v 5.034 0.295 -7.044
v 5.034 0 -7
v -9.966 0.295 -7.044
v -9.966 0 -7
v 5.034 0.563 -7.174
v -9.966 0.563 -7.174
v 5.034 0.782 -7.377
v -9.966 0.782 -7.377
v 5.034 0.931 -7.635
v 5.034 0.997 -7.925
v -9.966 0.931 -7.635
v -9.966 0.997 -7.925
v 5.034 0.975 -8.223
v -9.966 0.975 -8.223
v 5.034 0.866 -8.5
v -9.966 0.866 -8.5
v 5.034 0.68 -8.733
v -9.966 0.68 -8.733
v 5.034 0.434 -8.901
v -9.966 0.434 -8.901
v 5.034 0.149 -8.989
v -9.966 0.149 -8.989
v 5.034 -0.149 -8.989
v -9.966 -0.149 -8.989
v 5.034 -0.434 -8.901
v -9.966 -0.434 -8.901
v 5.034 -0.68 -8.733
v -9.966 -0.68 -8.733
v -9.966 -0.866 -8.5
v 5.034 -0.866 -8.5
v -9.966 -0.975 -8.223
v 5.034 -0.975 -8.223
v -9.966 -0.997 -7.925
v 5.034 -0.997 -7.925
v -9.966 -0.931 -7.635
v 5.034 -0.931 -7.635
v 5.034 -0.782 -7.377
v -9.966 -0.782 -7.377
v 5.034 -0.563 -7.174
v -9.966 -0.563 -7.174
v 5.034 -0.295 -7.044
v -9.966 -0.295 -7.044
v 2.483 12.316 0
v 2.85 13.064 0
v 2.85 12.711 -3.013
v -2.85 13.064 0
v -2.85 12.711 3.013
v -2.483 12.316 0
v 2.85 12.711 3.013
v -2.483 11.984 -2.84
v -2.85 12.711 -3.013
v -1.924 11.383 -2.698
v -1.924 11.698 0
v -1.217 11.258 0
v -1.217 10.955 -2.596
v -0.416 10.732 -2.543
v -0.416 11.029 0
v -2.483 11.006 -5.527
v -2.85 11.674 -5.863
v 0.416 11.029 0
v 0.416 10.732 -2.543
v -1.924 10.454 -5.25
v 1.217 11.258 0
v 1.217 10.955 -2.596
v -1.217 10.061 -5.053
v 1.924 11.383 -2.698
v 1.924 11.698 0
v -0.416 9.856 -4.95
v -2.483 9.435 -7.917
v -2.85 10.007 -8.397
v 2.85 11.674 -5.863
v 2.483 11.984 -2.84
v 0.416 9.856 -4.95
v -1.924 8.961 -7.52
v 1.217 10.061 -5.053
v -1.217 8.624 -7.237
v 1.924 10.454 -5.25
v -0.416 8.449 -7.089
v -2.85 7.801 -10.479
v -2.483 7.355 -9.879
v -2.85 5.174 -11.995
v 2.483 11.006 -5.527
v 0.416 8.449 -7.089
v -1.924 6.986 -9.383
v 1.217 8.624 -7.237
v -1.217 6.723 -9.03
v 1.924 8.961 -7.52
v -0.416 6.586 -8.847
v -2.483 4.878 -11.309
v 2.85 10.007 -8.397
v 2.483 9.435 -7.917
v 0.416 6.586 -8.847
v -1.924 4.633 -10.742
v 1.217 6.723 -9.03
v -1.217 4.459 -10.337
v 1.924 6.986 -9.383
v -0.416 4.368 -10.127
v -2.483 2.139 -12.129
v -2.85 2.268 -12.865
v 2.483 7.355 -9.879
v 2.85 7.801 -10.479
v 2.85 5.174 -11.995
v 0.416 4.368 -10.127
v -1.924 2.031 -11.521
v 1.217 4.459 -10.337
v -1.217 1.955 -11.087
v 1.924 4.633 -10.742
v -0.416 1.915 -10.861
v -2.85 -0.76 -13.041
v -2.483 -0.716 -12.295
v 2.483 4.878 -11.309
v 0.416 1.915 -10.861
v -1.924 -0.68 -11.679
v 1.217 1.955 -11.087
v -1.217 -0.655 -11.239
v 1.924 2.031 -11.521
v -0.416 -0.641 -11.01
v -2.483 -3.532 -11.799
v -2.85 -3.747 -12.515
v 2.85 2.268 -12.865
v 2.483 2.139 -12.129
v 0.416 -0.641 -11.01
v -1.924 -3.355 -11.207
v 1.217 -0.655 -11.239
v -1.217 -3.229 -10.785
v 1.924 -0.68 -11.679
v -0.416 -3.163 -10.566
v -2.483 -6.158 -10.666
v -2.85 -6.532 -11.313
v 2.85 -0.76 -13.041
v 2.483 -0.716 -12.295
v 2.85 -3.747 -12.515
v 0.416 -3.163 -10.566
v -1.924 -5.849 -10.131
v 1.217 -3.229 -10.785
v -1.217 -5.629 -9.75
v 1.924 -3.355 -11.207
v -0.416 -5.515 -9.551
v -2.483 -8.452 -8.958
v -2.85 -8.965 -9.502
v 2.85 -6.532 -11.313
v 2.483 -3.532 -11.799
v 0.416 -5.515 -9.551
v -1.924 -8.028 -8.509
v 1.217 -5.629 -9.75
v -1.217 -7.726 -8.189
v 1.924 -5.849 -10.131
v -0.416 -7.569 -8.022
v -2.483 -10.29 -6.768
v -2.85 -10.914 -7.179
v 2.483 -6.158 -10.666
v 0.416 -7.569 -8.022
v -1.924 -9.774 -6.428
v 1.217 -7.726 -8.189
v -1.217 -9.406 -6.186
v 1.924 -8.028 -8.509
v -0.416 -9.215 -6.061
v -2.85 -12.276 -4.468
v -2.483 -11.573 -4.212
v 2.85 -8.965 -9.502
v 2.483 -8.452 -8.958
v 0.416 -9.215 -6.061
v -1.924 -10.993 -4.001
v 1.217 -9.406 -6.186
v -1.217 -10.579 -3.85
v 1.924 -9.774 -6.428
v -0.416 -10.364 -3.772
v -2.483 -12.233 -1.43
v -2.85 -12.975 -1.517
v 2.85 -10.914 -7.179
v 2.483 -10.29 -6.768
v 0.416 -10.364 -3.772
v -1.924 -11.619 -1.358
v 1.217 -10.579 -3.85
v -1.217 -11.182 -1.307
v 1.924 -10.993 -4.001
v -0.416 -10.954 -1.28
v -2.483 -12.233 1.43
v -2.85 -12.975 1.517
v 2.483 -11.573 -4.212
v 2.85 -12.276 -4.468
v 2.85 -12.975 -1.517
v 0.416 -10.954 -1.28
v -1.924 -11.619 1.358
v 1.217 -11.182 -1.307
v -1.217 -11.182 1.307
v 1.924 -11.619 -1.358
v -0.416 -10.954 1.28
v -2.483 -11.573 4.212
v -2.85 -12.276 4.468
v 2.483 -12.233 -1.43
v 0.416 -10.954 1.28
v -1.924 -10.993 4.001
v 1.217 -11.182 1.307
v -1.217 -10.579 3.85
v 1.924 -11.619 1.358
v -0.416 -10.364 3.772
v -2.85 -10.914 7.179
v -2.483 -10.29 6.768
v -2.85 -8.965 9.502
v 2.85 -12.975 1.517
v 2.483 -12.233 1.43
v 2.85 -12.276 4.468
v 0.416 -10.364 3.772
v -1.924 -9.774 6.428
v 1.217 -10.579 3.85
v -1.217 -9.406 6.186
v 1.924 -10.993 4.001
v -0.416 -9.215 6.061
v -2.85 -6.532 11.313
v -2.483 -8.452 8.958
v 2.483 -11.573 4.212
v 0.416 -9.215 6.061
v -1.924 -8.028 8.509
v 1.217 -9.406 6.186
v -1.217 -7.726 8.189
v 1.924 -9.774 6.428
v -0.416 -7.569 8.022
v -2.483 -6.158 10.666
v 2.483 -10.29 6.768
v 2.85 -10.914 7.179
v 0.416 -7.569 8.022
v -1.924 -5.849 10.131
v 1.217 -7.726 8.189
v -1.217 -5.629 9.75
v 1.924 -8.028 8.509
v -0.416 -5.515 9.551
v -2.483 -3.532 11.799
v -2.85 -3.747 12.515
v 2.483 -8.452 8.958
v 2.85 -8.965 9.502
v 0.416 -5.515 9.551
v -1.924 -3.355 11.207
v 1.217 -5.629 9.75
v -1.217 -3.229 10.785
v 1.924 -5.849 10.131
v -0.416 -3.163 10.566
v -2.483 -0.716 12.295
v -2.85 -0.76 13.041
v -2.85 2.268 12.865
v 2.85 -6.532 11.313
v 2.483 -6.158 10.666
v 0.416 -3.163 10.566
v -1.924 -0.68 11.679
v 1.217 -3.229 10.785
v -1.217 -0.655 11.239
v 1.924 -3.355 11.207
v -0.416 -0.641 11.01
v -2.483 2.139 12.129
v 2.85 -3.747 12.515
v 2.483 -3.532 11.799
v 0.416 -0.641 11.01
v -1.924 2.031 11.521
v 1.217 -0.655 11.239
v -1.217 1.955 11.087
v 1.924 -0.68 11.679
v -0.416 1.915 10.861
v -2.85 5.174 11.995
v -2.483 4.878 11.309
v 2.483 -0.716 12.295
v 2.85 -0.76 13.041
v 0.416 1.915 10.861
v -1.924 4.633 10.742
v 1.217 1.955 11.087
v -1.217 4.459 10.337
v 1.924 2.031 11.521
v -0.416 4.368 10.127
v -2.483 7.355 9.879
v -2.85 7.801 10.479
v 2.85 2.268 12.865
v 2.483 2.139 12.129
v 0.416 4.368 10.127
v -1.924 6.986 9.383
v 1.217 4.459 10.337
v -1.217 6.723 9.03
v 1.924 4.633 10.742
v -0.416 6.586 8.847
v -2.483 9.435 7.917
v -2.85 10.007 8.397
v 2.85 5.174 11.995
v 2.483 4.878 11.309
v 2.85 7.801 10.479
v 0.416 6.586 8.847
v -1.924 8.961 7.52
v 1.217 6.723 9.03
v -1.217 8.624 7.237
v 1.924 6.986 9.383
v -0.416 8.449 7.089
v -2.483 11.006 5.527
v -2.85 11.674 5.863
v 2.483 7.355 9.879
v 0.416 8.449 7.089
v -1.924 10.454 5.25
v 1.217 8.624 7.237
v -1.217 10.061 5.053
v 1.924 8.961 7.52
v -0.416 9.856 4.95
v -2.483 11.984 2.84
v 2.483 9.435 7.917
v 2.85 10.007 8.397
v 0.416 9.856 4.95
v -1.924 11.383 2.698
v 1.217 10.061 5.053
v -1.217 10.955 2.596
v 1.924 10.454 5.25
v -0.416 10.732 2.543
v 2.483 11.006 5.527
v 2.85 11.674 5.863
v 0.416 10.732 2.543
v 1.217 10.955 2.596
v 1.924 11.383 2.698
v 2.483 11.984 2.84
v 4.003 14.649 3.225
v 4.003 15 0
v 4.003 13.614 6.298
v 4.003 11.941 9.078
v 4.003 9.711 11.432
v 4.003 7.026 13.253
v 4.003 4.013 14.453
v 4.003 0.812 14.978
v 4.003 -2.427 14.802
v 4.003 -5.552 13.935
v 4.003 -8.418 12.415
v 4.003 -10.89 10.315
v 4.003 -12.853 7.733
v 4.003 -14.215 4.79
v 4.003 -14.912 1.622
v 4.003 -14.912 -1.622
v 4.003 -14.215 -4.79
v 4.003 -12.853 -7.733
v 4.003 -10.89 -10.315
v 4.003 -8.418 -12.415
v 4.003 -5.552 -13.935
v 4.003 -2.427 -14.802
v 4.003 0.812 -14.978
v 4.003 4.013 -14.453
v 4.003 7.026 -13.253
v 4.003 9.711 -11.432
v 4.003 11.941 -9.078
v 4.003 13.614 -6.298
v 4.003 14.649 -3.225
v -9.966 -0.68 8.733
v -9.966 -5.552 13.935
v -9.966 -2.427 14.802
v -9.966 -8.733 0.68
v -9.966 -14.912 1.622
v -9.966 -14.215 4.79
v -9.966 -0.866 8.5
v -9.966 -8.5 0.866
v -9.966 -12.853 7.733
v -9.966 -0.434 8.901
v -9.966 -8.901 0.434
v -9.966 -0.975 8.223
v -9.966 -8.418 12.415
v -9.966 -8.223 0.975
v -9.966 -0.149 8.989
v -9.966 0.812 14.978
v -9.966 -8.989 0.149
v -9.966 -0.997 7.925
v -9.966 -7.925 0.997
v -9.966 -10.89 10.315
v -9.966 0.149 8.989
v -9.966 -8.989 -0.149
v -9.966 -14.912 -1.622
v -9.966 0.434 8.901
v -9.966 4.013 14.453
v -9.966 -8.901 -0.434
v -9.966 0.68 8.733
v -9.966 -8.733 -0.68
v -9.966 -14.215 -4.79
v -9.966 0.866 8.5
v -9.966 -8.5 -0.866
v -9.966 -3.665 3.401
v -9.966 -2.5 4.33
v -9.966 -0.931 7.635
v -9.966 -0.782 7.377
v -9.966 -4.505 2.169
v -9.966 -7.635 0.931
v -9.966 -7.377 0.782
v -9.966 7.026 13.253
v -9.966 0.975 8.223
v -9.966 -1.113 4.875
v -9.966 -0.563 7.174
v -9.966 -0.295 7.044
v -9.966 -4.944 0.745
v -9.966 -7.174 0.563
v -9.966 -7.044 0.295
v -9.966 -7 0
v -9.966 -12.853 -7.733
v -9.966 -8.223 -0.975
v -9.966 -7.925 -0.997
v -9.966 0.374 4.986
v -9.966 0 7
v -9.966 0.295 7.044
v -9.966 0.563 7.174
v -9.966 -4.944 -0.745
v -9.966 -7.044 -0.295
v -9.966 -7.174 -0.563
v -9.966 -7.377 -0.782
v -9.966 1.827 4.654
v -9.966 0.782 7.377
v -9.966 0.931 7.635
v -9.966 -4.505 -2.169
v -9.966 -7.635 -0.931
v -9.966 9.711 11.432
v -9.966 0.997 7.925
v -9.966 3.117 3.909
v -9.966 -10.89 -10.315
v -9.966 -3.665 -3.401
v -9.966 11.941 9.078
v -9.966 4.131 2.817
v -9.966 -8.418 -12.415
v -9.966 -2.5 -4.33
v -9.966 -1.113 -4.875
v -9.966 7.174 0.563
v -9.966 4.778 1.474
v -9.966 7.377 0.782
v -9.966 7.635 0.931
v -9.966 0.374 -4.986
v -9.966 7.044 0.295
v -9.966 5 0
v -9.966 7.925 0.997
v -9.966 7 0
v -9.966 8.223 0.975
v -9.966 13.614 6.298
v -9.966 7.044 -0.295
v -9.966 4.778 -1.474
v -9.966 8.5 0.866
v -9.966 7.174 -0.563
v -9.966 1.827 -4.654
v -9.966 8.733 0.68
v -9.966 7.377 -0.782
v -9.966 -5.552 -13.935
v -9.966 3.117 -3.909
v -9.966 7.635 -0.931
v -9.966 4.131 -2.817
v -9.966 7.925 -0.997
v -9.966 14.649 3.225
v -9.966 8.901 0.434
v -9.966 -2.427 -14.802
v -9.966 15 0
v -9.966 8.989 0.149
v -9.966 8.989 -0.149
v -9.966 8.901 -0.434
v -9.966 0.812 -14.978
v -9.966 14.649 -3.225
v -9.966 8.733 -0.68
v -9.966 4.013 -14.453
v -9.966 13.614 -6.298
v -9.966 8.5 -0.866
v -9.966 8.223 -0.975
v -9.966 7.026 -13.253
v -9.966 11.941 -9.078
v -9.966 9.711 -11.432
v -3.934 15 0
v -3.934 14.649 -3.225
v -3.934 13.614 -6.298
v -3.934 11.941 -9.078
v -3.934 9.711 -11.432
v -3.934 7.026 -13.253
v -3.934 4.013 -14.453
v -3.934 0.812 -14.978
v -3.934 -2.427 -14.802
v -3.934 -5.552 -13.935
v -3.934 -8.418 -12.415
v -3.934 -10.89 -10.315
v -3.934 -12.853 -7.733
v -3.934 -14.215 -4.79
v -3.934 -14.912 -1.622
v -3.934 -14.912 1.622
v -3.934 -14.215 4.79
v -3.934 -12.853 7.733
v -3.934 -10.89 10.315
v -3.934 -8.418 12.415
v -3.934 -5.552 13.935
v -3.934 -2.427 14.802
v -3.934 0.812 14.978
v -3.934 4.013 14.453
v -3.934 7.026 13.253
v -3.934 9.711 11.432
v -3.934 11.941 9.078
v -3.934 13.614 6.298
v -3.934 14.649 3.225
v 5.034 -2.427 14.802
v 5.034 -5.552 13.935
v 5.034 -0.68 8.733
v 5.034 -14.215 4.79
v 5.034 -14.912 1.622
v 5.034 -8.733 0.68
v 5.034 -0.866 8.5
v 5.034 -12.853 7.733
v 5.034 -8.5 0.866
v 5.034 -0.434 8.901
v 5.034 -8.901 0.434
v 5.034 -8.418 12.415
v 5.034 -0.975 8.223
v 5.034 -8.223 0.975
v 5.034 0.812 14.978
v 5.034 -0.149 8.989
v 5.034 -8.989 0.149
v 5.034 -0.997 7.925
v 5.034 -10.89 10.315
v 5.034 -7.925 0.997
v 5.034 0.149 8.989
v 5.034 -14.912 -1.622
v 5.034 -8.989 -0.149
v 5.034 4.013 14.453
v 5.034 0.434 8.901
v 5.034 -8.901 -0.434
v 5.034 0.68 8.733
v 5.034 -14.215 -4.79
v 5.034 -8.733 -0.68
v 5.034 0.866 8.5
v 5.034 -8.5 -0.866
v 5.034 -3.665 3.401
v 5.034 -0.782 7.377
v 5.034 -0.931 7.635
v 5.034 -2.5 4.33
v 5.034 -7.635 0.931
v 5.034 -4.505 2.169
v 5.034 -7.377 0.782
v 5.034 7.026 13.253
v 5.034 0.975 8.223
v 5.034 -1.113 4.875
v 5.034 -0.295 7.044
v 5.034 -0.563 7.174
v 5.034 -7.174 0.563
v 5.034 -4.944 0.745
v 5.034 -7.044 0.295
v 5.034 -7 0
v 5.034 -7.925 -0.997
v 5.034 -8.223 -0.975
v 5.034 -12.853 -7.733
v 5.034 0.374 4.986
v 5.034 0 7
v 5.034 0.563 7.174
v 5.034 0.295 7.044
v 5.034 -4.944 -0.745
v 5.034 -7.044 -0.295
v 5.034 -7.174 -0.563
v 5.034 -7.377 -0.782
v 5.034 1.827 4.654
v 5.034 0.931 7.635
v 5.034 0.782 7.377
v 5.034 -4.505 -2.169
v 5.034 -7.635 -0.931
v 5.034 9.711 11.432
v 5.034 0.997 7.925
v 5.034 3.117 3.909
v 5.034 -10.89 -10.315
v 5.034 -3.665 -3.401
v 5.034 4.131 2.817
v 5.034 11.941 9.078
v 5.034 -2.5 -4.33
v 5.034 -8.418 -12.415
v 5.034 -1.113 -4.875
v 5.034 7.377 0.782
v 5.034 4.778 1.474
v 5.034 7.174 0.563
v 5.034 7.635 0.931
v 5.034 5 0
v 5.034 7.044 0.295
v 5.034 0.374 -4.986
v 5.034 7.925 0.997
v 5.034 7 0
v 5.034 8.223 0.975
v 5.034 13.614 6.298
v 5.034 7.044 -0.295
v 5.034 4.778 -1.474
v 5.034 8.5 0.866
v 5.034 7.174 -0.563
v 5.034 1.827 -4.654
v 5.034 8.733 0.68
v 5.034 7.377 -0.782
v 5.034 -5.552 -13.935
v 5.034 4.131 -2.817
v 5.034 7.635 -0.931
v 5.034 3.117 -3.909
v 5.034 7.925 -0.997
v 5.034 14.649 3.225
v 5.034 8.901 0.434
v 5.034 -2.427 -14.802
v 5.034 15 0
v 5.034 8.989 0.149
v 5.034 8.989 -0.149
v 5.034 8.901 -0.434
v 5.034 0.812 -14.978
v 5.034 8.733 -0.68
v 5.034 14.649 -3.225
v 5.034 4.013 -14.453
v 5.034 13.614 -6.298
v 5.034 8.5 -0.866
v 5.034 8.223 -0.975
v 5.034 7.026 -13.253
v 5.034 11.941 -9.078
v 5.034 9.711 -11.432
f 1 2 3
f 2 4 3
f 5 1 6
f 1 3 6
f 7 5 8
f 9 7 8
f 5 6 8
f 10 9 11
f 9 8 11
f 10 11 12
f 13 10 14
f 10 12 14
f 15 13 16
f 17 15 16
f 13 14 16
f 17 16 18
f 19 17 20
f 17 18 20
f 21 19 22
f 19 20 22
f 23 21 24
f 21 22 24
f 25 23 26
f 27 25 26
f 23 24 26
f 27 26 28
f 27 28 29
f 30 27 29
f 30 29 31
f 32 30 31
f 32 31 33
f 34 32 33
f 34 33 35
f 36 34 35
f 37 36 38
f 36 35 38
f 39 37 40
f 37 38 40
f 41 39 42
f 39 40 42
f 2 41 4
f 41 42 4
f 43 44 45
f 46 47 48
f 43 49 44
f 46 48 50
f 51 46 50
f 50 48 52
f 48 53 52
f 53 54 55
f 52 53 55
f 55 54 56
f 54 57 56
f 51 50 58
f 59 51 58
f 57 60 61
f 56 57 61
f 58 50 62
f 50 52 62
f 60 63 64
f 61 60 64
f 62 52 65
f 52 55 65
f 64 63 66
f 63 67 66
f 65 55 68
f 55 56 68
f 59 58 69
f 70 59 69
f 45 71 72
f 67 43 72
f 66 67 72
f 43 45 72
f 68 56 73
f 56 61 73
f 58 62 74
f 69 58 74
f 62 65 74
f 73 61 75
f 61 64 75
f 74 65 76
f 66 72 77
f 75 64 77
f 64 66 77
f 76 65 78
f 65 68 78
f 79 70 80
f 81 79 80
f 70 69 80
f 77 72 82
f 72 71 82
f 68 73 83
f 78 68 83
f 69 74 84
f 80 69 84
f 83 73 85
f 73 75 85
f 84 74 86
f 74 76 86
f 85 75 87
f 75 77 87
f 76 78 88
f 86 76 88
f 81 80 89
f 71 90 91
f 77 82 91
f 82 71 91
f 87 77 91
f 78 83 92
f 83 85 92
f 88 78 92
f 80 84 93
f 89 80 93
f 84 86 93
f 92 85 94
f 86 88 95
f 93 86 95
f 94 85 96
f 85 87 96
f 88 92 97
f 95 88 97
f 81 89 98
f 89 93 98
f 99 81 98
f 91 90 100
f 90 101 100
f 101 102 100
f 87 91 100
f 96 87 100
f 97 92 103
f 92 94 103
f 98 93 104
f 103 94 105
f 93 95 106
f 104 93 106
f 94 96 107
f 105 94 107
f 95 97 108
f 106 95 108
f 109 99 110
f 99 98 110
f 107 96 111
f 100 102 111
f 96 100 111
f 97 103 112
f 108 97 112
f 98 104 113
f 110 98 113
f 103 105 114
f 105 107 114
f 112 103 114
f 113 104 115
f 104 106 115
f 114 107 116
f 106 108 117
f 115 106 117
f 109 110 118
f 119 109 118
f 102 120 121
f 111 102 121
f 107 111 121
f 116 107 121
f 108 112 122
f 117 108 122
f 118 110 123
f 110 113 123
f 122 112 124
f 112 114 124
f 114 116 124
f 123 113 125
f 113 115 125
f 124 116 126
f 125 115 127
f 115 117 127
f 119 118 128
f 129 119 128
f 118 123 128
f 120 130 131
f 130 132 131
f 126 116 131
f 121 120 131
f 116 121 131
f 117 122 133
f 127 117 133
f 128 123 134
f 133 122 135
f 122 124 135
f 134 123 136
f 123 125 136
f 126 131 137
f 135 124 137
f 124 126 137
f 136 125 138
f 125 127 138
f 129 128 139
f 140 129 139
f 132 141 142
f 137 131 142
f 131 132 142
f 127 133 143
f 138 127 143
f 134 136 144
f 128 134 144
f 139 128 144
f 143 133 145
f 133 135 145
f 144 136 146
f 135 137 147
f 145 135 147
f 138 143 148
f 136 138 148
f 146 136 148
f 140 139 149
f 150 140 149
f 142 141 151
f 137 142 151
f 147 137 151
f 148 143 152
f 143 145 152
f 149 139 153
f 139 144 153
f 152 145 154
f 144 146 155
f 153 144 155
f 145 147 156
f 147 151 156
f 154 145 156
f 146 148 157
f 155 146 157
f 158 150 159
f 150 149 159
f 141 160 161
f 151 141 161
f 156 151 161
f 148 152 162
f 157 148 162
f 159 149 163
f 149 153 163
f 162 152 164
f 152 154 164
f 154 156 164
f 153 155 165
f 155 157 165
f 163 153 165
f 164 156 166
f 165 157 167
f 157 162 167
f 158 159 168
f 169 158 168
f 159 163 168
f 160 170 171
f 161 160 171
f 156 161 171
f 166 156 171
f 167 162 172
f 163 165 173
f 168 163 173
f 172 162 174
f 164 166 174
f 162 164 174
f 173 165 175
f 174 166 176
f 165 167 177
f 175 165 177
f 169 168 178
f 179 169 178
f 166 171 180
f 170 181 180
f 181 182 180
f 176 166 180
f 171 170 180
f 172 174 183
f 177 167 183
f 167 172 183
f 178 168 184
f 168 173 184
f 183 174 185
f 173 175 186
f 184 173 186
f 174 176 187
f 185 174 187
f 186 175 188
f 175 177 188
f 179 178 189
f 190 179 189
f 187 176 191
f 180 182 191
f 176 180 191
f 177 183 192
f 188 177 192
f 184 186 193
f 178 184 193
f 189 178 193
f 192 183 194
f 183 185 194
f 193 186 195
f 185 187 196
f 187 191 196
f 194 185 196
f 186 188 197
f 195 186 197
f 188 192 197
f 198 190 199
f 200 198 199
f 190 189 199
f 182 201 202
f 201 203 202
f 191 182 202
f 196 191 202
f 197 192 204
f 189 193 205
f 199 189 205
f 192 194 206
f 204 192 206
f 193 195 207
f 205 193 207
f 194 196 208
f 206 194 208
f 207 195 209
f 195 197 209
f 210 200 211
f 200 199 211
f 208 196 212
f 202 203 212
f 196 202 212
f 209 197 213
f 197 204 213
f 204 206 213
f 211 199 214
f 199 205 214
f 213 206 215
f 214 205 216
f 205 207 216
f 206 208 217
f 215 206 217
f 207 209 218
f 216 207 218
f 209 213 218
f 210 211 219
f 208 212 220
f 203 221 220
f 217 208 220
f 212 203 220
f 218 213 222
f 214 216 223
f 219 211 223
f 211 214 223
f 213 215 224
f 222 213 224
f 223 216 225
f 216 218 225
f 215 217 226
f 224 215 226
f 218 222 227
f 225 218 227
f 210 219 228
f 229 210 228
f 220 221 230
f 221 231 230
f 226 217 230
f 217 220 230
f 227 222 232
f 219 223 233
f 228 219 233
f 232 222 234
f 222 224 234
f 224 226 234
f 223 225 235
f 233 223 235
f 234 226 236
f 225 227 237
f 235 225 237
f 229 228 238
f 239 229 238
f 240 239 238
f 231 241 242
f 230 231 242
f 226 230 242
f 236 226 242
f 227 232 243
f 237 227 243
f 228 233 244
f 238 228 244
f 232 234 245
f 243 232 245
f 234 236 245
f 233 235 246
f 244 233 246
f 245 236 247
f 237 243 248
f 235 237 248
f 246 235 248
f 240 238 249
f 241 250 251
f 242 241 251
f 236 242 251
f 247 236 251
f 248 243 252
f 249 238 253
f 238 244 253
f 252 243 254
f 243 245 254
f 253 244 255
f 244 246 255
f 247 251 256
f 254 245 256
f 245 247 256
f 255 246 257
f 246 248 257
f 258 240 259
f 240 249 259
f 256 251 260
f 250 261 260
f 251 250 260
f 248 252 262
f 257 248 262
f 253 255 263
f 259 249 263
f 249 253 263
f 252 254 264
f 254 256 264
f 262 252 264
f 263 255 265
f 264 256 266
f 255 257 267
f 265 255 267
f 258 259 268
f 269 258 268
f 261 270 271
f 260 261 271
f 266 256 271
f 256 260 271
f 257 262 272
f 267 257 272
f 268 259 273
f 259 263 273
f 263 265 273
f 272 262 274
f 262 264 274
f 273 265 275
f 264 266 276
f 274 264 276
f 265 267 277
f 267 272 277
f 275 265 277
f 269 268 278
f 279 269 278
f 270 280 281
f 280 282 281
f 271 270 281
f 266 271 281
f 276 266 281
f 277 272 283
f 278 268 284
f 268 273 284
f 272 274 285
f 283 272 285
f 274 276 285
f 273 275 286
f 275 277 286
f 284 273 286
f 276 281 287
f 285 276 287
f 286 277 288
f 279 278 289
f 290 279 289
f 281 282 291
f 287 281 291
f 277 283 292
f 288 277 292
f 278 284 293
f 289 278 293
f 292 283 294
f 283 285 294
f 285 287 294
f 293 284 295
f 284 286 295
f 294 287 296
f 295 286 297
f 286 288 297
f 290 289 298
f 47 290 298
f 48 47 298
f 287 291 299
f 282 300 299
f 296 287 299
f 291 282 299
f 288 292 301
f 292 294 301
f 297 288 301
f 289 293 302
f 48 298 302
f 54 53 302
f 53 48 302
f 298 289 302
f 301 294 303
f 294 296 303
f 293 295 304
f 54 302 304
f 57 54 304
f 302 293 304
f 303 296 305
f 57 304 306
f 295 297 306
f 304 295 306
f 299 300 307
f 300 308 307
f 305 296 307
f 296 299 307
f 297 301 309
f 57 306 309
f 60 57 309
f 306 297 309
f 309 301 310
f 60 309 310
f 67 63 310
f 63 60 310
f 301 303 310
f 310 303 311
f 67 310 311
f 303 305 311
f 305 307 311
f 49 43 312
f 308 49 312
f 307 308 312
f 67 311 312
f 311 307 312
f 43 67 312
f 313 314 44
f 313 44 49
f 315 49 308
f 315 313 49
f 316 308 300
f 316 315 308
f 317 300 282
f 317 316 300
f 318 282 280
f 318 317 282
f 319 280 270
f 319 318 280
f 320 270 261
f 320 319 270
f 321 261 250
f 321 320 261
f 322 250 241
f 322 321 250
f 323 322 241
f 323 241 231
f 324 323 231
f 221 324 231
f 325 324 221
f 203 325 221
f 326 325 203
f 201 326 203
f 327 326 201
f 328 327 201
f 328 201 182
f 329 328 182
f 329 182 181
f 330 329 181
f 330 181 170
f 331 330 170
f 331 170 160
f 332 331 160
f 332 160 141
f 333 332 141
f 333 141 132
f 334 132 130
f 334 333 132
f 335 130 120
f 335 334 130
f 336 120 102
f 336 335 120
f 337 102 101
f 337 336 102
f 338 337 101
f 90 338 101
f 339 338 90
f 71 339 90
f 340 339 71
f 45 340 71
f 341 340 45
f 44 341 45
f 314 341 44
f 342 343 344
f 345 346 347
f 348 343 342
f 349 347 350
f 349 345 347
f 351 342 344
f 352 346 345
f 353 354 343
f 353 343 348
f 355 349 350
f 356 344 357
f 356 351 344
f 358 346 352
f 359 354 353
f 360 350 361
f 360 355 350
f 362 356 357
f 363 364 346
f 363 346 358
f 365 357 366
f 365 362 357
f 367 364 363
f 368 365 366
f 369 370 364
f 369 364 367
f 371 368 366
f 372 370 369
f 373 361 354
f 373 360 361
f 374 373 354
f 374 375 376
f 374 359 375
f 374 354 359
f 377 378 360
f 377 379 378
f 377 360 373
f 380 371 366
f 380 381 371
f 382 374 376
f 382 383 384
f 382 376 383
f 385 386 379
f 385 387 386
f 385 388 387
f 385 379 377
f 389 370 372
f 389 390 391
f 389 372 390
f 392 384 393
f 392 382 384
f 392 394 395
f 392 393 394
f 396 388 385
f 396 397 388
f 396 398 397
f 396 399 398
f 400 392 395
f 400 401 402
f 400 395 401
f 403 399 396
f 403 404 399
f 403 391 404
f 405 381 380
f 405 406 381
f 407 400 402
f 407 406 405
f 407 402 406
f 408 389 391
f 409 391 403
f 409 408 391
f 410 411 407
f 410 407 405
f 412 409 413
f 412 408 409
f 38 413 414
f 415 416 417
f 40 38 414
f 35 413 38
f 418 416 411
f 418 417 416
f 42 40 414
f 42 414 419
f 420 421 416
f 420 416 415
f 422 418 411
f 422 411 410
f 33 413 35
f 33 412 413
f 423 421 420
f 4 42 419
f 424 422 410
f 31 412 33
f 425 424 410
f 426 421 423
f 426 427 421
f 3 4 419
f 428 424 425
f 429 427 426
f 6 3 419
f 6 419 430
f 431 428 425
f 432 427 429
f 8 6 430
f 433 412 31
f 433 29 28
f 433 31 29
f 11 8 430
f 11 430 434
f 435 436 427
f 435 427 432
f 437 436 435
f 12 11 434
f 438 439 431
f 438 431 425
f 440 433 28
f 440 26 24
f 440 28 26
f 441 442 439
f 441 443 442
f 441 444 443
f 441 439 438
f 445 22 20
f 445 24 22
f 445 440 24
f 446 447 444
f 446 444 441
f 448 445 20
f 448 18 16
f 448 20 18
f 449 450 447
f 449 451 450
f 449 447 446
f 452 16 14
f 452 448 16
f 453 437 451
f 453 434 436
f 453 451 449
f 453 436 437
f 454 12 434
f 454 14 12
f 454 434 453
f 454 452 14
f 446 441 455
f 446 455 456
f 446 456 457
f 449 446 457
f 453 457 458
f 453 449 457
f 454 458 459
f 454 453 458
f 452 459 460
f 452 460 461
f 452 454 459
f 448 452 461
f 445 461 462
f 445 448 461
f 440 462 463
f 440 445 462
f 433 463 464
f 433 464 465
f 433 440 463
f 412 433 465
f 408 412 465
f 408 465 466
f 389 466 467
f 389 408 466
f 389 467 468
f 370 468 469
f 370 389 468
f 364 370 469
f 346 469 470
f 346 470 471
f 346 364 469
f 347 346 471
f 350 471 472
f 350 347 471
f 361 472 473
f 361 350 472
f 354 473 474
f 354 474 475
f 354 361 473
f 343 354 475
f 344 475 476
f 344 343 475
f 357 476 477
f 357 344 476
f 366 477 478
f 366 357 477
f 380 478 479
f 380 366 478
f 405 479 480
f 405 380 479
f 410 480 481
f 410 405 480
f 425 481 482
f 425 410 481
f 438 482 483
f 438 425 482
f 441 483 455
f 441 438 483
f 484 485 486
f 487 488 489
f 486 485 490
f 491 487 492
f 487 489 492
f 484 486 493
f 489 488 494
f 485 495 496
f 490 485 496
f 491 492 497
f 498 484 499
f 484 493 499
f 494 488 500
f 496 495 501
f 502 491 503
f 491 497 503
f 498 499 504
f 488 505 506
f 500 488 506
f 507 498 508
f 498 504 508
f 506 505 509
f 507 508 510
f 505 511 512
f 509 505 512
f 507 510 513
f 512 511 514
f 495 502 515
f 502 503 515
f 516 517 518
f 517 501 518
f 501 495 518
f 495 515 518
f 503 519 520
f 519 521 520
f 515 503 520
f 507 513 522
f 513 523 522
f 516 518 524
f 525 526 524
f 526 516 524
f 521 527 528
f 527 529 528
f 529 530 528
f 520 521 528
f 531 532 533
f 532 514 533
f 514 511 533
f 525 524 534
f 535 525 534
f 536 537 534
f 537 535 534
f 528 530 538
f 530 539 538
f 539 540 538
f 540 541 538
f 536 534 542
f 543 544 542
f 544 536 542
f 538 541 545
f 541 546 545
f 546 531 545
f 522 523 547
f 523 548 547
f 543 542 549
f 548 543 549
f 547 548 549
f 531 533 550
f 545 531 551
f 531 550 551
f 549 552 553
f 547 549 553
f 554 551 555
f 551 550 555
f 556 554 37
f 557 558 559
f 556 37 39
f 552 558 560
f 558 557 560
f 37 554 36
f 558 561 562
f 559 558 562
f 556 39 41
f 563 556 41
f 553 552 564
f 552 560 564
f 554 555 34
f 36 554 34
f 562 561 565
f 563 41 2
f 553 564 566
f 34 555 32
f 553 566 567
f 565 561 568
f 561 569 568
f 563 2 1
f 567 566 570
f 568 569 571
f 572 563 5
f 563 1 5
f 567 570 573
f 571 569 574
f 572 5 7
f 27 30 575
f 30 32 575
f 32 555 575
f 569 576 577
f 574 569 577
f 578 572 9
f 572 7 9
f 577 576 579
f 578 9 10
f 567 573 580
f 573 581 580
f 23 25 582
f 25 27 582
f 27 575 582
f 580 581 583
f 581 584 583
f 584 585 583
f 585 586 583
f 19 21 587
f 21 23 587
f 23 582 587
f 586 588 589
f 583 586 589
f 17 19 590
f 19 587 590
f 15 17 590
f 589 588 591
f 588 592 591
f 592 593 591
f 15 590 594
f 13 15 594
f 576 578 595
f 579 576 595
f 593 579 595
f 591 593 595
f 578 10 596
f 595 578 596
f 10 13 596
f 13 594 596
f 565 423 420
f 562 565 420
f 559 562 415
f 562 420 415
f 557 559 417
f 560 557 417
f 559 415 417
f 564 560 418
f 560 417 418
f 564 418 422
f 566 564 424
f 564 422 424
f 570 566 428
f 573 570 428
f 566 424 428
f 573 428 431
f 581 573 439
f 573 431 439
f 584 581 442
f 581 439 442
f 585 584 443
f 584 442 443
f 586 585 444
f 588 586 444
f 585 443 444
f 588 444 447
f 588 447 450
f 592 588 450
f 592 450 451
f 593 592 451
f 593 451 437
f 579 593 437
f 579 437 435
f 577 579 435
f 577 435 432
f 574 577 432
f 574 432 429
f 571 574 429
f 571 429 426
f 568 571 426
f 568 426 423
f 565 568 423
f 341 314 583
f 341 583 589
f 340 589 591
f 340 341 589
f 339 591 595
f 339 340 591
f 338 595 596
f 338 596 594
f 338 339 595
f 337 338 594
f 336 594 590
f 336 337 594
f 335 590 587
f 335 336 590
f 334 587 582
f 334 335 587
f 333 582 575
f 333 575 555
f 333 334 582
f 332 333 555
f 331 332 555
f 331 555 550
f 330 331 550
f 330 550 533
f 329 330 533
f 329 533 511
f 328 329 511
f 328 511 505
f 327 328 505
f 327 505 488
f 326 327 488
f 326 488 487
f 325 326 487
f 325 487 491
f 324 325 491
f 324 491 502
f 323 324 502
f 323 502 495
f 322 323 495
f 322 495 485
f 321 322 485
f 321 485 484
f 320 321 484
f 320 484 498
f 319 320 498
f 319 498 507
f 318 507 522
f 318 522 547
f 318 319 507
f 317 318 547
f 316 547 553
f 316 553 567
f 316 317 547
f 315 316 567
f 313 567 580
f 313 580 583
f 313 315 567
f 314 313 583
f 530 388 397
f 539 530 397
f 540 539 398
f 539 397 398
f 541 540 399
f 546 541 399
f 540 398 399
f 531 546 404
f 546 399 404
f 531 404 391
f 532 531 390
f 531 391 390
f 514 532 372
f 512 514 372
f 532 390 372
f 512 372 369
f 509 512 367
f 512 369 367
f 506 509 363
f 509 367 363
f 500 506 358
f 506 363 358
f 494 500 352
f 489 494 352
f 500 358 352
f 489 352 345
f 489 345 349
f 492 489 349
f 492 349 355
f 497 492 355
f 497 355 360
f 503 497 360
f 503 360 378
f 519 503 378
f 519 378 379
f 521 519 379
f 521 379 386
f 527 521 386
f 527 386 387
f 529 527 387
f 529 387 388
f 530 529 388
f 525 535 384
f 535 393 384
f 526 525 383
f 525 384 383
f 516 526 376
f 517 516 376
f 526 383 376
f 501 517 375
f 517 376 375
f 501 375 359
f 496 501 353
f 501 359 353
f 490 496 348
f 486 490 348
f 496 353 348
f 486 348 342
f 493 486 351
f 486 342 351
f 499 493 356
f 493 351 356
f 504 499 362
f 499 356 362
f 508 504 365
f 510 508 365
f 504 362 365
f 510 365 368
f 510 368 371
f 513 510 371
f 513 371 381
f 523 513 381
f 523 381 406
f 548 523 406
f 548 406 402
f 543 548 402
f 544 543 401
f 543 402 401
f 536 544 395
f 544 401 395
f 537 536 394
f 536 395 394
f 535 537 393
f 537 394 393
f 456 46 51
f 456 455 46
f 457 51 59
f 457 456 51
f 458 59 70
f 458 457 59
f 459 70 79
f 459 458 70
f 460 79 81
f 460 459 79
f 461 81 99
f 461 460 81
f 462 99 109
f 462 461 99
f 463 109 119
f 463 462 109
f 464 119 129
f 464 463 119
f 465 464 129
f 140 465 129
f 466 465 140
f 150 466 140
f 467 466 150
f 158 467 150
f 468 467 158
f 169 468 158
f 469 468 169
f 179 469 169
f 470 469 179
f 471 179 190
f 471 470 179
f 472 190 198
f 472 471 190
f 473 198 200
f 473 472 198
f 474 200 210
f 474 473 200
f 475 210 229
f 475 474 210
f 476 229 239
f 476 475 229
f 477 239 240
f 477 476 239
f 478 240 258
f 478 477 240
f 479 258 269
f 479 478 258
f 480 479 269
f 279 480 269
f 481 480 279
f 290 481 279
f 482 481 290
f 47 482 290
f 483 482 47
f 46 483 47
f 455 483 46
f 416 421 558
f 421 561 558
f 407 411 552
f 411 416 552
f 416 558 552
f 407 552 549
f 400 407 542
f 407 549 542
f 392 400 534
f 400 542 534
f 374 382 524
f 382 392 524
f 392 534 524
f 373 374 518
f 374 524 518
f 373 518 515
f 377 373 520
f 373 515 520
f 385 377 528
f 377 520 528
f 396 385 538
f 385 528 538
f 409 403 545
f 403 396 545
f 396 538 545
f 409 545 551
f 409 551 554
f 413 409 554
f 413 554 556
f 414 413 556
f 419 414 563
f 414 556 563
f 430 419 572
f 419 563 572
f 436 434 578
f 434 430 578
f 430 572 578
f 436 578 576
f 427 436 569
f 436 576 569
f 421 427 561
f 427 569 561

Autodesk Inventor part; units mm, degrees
ref_plane "YZ Plane" through (0, 0, 0) normal (1, 0, 0) x (0, 1, 0)
ref_plane "XZ Plane" through (0, 0, 0) normal (0, 1, 0) x (-1, 0, 0)
ref_plane "XY Plane" through (0, 0, 0) normal (0, 0, 1) x (1, 0, 0)
sketch "Sketch1" plane through (0, 0, 0) normal (0, 0, 1) x (1, 0, 0)
  line L0 (5, 0) -> (-5, 0)
  line L1 (-4.9655, 15) -> (-4.9655, 5)
  line L2 (-4.9655, 5) -> (5.0345, 5)
  line L3 (5.0345, 5) -> (5.0345, 15)
  line L4 (5.0345, 15) -> (4.0026, 15)
  line L5 (4.0026, 15) -> (2.8501, 13.0635)
  arc A0 (-2.8501, 13.0635) -> (2.8501, 13.0635) centre (0, 14) ccw
  line L6 (-2.8501, 13.0635) -> (-3.9336, 15)
  line L7 (-3.9336, 15) -> (-4.9655, 15)
  line L8 (-4.9655, 15) -> (-9.9655, 15)
  line L9 (-9.9655, 15) -> (-9.9655, 5)
  line L10 (-9.9655, 5) -> (-4.9655, 5)
  line L11 (0, 11) -> (0, 14)
  line L12 (0, 14) -> (0, 15)
  line L13 (0, 15) -> (4.0026, 15)
  point P0 (0, 0)
  dimension "d12" = 10
  dimension "d13" = 10
  dimension "d14" = 5
  dimension "d15" = 143.621
  dimension "d16" = 3
  dimension "d17" = 1.0319
  dimension "d18" = 1.0319
  dimension "d20" = 1
  dimension "d22" = 1.9365
  dimension "d23" = 4.0026
revolve "Revolution1" add sketch "Sketch1" angle 360 about axis through (5, 0, 0) along (-1, 0, 0) contours L7 L6 A0 L5 L4 L3 L2 L1 | L1 L10 L9 L8
sketch "Sketch2" plane through (5.0345, 0, 0) normal (1, 0, 0) x (0, 0, -1)
  circle A0 centre (0, 0) radius 5 projected
  circle A1 centre (0, 0) radius 8
  line L0 (-8, 0) -> (8, 0)
  dimension "d1" = 16
hole "Hole1" at (5.0345, 0, 8) direction (-1, 0, 0) diameter 2 end through all
pattern_circular "Circular Pattern1" count 4 over 360 about axis through (-7.4655, 0, 0) along (1, 0, 0) of "Hole1"
properties part number "motor_trinse"
